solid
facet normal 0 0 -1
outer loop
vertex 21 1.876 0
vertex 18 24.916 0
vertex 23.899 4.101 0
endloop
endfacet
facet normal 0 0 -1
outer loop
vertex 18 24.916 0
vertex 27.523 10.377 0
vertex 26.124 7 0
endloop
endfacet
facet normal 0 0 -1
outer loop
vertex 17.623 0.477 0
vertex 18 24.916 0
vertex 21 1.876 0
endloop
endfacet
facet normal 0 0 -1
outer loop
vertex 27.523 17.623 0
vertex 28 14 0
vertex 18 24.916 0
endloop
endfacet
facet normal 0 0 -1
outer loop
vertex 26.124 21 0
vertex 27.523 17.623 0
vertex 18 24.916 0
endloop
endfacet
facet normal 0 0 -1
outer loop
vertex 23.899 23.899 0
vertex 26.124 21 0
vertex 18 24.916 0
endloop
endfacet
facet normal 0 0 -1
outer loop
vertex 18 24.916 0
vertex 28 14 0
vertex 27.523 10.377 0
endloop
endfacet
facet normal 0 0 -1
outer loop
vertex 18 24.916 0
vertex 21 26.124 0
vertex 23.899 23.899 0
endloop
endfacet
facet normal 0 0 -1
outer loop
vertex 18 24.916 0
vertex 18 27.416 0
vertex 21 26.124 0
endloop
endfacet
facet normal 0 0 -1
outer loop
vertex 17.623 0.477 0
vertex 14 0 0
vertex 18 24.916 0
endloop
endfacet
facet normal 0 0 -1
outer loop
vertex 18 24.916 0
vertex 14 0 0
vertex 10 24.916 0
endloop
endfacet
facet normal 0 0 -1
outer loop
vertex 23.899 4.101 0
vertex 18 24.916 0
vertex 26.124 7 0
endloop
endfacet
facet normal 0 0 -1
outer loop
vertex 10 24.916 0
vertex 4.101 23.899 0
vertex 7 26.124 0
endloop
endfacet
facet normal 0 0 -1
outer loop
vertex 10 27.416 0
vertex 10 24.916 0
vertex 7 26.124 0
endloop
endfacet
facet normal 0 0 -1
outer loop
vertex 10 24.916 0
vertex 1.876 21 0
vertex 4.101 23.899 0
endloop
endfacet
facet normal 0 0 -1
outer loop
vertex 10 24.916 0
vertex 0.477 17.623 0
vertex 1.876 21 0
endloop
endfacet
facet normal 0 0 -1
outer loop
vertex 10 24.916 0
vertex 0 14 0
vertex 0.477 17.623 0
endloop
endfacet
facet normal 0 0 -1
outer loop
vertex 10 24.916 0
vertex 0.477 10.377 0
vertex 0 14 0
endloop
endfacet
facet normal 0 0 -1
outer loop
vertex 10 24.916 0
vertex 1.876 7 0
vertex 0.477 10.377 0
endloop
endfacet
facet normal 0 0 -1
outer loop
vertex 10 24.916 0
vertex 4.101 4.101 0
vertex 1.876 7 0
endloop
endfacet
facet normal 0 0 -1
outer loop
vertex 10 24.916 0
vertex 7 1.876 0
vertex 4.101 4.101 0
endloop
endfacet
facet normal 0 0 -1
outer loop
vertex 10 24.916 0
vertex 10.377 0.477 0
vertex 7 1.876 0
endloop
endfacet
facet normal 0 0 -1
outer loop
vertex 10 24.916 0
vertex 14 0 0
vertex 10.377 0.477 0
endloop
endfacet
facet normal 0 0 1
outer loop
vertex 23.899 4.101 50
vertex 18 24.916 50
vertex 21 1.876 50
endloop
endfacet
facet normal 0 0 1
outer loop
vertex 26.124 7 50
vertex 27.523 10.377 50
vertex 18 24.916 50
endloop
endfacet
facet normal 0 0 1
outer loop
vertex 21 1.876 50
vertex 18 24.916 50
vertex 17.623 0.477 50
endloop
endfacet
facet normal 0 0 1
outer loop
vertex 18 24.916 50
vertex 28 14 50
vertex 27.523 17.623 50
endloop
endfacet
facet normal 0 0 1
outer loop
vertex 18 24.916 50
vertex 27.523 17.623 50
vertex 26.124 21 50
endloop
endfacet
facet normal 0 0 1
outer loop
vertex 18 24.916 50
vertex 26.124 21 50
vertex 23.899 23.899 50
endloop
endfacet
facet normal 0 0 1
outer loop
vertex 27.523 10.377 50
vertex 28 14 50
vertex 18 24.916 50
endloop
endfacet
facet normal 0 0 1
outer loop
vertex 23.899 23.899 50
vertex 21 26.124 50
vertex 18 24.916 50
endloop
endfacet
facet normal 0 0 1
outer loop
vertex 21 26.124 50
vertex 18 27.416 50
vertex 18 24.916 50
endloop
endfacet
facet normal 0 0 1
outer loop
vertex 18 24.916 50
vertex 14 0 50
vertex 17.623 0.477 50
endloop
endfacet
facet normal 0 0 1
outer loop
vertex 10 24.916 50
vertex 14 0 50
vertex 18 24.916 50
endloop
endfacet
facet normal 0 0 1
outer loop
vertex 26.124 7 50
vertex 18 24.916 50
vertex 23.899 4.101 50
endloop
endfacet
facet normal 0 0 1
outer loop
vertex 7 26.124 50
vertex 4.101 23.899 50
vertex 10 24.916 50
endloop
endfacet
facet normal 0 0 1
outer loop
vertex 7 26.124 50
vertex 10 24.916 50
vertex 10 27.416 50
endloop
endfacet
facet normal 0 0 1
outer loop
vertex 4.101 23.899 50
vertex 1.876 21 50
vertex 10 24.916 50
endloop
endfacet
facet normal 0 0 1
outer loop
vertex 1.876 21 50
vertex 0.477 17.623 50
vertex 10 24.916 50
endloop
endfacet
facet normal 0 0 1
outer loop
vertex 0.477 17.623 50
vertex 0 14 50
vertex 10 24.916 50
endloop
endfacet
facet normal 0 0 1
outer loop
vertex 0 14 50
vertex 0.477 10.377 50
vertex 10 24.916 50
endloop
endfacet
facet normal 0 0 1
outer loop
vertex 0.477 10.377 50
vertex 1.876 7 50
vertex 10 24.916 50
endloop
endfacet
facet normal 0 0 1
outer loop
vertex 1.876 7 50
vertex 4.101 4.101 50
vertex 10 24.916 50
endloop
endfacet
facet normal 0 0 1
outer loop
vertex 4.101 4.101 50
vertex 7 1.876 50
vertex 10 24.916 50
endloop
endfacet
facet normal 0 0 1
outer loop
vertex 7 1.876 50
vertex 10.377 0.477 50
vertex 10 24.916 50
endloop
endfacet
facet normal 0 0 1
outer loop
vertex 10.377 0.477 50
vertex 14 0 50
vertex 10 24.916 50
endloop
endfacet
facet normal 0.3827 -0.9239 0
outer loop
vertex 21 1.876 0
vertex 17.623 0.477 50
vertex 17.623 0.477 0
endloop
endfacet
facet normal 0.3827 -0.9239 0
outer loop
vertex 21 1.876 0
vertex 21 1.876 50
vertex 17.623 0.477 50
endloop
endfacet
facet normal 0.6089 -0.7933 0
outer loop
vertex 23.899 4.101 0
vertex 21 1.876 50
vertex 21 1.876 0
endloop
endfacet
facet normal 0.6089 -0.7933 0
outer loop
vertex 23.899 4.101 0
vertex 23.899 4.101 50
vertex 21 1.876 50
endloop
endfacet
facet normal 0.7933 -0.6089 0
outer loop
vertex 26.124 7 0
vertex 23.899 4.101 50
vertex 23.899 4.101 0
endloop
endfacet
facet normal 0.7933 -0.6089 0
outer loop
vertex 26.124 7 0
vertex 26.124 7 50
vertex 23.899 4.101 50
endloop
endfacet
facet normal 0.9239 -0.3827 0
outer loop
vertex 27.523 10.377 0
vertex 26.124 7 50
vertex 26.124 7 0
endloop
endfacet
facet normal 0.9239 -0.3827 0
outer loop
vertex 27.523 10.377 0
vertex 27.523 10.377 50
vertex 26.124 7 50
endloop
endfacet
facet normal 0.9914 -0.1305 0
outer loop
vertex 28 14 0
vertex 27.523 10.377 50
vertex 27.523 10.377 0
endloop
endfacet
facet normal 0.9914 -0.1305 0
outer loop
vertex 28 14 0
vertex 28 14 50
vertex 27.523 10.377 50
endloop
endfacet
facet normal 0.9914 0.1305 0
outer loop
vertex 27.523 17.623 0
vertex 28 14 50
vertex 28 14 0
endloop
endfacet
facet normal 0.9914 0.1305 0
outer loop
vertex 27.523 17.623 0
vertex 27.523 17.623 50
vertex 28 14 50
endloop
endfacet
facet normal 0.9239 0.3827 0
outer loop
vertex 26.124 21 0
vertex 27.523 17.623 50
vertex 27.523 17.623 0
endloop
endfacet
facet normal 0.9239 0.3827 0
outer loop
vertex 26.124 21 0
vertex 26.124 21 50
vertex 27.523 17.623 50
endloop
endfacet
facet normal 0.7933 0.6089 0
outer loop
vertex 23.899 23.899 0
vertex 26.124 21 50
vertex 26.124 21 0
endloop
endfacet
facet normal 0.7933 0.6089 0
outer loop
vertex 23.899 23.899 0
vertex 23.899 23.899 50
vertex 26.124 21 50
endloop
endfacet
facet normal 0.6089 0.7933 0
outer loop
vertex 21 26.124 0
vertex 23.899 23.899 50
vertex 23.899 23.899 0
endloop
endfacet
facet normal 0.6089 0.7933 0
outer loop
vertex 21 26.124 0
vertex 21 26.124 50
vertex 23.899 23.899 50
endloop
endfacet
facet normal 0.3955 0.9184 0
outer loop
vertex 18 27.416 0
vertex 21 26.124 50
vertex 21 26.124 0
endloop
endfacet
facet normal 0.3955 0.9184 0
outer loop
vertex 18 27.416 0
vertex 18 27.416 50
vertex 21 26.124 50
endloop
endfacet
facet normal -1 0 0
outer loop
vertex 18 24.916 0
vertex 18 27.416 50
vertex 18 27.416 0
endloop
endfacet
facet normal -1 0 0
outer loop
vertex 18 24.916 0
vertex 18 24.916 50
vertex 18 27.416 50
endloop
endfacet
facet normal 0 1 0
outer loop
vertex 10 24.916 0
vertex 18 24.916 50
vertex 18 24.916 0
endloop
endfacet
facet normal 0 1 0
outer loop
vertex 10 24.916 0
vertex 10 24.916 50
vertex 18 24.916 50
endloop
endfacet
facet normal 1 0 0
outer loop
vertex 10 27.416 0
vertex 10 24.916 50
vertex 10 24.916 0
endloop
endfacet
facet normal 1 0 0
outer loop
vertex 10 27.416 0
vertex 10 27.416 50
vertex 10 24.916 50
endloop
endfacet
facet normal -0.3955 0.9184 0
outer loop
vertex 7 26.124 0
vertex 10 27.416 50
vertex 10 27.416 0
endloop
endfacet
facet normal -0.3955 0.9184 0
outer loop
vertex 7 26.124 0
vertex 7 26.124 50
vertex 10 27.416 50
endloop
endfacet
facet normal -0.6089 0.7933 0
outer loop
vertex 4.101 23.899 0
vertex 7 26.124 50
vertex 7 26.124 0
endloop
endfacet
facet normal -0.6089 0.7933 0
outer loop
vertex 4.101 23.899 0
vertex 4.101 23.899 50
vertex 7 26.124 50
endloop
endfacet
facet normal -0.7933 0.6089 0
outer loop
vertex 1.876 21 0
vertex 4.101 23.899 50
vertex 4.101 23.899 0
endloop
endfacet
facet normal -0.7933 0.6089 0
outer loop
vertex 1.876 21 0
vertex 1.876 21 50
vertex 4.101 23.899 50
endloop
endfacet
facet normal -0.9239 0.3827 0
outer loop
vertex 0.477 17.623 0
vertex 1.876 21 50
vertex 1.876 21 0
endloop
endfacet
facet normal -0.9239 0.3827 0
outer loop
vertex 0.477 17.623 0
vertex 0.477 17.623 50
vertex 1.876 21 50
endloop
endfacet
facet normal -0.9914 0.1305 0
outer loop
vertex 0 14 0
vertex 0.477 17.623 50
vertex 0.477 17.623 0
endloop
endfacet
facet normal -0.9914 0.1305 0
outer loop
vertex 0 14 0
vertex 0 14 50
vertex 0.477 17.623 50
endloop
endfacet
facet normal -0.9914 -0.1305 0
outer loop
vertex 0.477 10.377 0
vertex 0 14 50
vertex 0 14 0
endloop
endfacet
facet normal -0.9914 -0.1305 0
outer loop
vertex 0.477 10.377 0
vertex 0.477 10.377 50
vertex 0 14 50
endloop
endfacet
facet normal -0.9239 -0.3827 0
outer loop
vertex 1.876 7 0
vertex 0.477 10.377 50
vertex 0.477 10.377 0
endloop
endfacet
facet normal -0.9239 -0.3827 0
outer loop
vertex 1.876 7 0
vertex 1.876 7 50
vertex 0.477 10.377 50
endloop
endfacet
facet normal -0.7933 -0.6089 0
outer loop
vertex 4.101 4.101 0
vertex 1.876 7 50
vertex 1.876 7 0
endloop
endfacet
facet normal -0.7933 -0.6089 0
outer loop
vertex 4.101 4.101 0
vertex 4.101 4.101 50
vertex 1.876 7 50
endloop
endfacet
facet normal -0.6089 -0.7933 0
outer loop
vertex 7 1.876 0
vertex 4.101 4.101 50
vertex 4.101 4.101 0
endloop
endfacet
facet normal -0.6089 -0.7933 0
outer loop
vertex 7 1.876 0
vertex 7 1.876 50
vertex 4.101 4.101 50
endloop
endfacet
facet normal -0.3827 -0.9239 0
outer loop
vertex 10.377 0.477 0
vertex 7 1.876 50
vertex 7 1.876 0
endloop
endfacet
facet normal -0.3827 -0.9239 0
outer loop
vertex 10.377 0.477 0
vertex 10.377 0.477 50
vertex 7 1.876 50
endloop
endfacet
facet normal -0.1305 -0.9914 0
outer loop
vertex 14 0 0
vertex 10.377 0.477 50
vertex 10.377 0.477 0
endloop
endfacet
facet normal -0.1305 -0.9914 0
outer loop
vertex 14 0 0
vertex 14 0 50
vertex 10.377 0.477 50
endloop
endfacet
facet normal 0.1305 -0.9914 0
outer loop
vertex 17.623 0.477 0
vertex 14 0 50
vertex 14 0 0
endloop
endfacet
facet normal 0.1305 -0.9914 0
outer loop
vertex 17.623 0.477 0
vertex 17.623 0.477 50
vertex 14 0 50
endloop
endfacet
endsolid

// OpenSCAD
$fn = 32;

// ----------------------------------------------------------------------
// Keyway shaft: d28 shaft, key 8 x 2.5 mm
// ----------------------------------------------------------------------

// --- parameters (mm) ---
shaft_r = 14;             // shaft radius
key_w = 8;                // keyway width
key_d = 2.5;              // keyway depth below the surface line
plate_t = 50;             // shaft length, Z (extrusion height)
fit_tol = 0.1;            // declared fit tolerance (prompt contract)
free_tol = 0.3;           // declared free tolerance (prompt contract)

shaft_d = 2 * shaft_r;  // shaft diameter
circle_step = 15;  // polygon sampling step, degrees

profile = [[7, 26.124], [4.101, 23.899], [1.876, 21], [0.477, 17.623], [0, 14], [0.477, 10.377], [1.876, 7], [4.101, 4.101], [7, 1.876], [10.377, 0.477], [14, 0], [17.623, 0.477], [21, 1.876], [23.899, 4.101], [26.124, 7], [27.523, 10.377], [28, 14], [27.523, 17.623], [26.124, 21], [23.899, 23.899], [21, 26.124], [18, 27.416], [18, 24.916], [10, 24.916], [10, 27.416]];  // primary outline, 25 points, counter clockwise

// --- the one profile operation ---
linear_extrude(height = plate_t) polygon(points = profile);
